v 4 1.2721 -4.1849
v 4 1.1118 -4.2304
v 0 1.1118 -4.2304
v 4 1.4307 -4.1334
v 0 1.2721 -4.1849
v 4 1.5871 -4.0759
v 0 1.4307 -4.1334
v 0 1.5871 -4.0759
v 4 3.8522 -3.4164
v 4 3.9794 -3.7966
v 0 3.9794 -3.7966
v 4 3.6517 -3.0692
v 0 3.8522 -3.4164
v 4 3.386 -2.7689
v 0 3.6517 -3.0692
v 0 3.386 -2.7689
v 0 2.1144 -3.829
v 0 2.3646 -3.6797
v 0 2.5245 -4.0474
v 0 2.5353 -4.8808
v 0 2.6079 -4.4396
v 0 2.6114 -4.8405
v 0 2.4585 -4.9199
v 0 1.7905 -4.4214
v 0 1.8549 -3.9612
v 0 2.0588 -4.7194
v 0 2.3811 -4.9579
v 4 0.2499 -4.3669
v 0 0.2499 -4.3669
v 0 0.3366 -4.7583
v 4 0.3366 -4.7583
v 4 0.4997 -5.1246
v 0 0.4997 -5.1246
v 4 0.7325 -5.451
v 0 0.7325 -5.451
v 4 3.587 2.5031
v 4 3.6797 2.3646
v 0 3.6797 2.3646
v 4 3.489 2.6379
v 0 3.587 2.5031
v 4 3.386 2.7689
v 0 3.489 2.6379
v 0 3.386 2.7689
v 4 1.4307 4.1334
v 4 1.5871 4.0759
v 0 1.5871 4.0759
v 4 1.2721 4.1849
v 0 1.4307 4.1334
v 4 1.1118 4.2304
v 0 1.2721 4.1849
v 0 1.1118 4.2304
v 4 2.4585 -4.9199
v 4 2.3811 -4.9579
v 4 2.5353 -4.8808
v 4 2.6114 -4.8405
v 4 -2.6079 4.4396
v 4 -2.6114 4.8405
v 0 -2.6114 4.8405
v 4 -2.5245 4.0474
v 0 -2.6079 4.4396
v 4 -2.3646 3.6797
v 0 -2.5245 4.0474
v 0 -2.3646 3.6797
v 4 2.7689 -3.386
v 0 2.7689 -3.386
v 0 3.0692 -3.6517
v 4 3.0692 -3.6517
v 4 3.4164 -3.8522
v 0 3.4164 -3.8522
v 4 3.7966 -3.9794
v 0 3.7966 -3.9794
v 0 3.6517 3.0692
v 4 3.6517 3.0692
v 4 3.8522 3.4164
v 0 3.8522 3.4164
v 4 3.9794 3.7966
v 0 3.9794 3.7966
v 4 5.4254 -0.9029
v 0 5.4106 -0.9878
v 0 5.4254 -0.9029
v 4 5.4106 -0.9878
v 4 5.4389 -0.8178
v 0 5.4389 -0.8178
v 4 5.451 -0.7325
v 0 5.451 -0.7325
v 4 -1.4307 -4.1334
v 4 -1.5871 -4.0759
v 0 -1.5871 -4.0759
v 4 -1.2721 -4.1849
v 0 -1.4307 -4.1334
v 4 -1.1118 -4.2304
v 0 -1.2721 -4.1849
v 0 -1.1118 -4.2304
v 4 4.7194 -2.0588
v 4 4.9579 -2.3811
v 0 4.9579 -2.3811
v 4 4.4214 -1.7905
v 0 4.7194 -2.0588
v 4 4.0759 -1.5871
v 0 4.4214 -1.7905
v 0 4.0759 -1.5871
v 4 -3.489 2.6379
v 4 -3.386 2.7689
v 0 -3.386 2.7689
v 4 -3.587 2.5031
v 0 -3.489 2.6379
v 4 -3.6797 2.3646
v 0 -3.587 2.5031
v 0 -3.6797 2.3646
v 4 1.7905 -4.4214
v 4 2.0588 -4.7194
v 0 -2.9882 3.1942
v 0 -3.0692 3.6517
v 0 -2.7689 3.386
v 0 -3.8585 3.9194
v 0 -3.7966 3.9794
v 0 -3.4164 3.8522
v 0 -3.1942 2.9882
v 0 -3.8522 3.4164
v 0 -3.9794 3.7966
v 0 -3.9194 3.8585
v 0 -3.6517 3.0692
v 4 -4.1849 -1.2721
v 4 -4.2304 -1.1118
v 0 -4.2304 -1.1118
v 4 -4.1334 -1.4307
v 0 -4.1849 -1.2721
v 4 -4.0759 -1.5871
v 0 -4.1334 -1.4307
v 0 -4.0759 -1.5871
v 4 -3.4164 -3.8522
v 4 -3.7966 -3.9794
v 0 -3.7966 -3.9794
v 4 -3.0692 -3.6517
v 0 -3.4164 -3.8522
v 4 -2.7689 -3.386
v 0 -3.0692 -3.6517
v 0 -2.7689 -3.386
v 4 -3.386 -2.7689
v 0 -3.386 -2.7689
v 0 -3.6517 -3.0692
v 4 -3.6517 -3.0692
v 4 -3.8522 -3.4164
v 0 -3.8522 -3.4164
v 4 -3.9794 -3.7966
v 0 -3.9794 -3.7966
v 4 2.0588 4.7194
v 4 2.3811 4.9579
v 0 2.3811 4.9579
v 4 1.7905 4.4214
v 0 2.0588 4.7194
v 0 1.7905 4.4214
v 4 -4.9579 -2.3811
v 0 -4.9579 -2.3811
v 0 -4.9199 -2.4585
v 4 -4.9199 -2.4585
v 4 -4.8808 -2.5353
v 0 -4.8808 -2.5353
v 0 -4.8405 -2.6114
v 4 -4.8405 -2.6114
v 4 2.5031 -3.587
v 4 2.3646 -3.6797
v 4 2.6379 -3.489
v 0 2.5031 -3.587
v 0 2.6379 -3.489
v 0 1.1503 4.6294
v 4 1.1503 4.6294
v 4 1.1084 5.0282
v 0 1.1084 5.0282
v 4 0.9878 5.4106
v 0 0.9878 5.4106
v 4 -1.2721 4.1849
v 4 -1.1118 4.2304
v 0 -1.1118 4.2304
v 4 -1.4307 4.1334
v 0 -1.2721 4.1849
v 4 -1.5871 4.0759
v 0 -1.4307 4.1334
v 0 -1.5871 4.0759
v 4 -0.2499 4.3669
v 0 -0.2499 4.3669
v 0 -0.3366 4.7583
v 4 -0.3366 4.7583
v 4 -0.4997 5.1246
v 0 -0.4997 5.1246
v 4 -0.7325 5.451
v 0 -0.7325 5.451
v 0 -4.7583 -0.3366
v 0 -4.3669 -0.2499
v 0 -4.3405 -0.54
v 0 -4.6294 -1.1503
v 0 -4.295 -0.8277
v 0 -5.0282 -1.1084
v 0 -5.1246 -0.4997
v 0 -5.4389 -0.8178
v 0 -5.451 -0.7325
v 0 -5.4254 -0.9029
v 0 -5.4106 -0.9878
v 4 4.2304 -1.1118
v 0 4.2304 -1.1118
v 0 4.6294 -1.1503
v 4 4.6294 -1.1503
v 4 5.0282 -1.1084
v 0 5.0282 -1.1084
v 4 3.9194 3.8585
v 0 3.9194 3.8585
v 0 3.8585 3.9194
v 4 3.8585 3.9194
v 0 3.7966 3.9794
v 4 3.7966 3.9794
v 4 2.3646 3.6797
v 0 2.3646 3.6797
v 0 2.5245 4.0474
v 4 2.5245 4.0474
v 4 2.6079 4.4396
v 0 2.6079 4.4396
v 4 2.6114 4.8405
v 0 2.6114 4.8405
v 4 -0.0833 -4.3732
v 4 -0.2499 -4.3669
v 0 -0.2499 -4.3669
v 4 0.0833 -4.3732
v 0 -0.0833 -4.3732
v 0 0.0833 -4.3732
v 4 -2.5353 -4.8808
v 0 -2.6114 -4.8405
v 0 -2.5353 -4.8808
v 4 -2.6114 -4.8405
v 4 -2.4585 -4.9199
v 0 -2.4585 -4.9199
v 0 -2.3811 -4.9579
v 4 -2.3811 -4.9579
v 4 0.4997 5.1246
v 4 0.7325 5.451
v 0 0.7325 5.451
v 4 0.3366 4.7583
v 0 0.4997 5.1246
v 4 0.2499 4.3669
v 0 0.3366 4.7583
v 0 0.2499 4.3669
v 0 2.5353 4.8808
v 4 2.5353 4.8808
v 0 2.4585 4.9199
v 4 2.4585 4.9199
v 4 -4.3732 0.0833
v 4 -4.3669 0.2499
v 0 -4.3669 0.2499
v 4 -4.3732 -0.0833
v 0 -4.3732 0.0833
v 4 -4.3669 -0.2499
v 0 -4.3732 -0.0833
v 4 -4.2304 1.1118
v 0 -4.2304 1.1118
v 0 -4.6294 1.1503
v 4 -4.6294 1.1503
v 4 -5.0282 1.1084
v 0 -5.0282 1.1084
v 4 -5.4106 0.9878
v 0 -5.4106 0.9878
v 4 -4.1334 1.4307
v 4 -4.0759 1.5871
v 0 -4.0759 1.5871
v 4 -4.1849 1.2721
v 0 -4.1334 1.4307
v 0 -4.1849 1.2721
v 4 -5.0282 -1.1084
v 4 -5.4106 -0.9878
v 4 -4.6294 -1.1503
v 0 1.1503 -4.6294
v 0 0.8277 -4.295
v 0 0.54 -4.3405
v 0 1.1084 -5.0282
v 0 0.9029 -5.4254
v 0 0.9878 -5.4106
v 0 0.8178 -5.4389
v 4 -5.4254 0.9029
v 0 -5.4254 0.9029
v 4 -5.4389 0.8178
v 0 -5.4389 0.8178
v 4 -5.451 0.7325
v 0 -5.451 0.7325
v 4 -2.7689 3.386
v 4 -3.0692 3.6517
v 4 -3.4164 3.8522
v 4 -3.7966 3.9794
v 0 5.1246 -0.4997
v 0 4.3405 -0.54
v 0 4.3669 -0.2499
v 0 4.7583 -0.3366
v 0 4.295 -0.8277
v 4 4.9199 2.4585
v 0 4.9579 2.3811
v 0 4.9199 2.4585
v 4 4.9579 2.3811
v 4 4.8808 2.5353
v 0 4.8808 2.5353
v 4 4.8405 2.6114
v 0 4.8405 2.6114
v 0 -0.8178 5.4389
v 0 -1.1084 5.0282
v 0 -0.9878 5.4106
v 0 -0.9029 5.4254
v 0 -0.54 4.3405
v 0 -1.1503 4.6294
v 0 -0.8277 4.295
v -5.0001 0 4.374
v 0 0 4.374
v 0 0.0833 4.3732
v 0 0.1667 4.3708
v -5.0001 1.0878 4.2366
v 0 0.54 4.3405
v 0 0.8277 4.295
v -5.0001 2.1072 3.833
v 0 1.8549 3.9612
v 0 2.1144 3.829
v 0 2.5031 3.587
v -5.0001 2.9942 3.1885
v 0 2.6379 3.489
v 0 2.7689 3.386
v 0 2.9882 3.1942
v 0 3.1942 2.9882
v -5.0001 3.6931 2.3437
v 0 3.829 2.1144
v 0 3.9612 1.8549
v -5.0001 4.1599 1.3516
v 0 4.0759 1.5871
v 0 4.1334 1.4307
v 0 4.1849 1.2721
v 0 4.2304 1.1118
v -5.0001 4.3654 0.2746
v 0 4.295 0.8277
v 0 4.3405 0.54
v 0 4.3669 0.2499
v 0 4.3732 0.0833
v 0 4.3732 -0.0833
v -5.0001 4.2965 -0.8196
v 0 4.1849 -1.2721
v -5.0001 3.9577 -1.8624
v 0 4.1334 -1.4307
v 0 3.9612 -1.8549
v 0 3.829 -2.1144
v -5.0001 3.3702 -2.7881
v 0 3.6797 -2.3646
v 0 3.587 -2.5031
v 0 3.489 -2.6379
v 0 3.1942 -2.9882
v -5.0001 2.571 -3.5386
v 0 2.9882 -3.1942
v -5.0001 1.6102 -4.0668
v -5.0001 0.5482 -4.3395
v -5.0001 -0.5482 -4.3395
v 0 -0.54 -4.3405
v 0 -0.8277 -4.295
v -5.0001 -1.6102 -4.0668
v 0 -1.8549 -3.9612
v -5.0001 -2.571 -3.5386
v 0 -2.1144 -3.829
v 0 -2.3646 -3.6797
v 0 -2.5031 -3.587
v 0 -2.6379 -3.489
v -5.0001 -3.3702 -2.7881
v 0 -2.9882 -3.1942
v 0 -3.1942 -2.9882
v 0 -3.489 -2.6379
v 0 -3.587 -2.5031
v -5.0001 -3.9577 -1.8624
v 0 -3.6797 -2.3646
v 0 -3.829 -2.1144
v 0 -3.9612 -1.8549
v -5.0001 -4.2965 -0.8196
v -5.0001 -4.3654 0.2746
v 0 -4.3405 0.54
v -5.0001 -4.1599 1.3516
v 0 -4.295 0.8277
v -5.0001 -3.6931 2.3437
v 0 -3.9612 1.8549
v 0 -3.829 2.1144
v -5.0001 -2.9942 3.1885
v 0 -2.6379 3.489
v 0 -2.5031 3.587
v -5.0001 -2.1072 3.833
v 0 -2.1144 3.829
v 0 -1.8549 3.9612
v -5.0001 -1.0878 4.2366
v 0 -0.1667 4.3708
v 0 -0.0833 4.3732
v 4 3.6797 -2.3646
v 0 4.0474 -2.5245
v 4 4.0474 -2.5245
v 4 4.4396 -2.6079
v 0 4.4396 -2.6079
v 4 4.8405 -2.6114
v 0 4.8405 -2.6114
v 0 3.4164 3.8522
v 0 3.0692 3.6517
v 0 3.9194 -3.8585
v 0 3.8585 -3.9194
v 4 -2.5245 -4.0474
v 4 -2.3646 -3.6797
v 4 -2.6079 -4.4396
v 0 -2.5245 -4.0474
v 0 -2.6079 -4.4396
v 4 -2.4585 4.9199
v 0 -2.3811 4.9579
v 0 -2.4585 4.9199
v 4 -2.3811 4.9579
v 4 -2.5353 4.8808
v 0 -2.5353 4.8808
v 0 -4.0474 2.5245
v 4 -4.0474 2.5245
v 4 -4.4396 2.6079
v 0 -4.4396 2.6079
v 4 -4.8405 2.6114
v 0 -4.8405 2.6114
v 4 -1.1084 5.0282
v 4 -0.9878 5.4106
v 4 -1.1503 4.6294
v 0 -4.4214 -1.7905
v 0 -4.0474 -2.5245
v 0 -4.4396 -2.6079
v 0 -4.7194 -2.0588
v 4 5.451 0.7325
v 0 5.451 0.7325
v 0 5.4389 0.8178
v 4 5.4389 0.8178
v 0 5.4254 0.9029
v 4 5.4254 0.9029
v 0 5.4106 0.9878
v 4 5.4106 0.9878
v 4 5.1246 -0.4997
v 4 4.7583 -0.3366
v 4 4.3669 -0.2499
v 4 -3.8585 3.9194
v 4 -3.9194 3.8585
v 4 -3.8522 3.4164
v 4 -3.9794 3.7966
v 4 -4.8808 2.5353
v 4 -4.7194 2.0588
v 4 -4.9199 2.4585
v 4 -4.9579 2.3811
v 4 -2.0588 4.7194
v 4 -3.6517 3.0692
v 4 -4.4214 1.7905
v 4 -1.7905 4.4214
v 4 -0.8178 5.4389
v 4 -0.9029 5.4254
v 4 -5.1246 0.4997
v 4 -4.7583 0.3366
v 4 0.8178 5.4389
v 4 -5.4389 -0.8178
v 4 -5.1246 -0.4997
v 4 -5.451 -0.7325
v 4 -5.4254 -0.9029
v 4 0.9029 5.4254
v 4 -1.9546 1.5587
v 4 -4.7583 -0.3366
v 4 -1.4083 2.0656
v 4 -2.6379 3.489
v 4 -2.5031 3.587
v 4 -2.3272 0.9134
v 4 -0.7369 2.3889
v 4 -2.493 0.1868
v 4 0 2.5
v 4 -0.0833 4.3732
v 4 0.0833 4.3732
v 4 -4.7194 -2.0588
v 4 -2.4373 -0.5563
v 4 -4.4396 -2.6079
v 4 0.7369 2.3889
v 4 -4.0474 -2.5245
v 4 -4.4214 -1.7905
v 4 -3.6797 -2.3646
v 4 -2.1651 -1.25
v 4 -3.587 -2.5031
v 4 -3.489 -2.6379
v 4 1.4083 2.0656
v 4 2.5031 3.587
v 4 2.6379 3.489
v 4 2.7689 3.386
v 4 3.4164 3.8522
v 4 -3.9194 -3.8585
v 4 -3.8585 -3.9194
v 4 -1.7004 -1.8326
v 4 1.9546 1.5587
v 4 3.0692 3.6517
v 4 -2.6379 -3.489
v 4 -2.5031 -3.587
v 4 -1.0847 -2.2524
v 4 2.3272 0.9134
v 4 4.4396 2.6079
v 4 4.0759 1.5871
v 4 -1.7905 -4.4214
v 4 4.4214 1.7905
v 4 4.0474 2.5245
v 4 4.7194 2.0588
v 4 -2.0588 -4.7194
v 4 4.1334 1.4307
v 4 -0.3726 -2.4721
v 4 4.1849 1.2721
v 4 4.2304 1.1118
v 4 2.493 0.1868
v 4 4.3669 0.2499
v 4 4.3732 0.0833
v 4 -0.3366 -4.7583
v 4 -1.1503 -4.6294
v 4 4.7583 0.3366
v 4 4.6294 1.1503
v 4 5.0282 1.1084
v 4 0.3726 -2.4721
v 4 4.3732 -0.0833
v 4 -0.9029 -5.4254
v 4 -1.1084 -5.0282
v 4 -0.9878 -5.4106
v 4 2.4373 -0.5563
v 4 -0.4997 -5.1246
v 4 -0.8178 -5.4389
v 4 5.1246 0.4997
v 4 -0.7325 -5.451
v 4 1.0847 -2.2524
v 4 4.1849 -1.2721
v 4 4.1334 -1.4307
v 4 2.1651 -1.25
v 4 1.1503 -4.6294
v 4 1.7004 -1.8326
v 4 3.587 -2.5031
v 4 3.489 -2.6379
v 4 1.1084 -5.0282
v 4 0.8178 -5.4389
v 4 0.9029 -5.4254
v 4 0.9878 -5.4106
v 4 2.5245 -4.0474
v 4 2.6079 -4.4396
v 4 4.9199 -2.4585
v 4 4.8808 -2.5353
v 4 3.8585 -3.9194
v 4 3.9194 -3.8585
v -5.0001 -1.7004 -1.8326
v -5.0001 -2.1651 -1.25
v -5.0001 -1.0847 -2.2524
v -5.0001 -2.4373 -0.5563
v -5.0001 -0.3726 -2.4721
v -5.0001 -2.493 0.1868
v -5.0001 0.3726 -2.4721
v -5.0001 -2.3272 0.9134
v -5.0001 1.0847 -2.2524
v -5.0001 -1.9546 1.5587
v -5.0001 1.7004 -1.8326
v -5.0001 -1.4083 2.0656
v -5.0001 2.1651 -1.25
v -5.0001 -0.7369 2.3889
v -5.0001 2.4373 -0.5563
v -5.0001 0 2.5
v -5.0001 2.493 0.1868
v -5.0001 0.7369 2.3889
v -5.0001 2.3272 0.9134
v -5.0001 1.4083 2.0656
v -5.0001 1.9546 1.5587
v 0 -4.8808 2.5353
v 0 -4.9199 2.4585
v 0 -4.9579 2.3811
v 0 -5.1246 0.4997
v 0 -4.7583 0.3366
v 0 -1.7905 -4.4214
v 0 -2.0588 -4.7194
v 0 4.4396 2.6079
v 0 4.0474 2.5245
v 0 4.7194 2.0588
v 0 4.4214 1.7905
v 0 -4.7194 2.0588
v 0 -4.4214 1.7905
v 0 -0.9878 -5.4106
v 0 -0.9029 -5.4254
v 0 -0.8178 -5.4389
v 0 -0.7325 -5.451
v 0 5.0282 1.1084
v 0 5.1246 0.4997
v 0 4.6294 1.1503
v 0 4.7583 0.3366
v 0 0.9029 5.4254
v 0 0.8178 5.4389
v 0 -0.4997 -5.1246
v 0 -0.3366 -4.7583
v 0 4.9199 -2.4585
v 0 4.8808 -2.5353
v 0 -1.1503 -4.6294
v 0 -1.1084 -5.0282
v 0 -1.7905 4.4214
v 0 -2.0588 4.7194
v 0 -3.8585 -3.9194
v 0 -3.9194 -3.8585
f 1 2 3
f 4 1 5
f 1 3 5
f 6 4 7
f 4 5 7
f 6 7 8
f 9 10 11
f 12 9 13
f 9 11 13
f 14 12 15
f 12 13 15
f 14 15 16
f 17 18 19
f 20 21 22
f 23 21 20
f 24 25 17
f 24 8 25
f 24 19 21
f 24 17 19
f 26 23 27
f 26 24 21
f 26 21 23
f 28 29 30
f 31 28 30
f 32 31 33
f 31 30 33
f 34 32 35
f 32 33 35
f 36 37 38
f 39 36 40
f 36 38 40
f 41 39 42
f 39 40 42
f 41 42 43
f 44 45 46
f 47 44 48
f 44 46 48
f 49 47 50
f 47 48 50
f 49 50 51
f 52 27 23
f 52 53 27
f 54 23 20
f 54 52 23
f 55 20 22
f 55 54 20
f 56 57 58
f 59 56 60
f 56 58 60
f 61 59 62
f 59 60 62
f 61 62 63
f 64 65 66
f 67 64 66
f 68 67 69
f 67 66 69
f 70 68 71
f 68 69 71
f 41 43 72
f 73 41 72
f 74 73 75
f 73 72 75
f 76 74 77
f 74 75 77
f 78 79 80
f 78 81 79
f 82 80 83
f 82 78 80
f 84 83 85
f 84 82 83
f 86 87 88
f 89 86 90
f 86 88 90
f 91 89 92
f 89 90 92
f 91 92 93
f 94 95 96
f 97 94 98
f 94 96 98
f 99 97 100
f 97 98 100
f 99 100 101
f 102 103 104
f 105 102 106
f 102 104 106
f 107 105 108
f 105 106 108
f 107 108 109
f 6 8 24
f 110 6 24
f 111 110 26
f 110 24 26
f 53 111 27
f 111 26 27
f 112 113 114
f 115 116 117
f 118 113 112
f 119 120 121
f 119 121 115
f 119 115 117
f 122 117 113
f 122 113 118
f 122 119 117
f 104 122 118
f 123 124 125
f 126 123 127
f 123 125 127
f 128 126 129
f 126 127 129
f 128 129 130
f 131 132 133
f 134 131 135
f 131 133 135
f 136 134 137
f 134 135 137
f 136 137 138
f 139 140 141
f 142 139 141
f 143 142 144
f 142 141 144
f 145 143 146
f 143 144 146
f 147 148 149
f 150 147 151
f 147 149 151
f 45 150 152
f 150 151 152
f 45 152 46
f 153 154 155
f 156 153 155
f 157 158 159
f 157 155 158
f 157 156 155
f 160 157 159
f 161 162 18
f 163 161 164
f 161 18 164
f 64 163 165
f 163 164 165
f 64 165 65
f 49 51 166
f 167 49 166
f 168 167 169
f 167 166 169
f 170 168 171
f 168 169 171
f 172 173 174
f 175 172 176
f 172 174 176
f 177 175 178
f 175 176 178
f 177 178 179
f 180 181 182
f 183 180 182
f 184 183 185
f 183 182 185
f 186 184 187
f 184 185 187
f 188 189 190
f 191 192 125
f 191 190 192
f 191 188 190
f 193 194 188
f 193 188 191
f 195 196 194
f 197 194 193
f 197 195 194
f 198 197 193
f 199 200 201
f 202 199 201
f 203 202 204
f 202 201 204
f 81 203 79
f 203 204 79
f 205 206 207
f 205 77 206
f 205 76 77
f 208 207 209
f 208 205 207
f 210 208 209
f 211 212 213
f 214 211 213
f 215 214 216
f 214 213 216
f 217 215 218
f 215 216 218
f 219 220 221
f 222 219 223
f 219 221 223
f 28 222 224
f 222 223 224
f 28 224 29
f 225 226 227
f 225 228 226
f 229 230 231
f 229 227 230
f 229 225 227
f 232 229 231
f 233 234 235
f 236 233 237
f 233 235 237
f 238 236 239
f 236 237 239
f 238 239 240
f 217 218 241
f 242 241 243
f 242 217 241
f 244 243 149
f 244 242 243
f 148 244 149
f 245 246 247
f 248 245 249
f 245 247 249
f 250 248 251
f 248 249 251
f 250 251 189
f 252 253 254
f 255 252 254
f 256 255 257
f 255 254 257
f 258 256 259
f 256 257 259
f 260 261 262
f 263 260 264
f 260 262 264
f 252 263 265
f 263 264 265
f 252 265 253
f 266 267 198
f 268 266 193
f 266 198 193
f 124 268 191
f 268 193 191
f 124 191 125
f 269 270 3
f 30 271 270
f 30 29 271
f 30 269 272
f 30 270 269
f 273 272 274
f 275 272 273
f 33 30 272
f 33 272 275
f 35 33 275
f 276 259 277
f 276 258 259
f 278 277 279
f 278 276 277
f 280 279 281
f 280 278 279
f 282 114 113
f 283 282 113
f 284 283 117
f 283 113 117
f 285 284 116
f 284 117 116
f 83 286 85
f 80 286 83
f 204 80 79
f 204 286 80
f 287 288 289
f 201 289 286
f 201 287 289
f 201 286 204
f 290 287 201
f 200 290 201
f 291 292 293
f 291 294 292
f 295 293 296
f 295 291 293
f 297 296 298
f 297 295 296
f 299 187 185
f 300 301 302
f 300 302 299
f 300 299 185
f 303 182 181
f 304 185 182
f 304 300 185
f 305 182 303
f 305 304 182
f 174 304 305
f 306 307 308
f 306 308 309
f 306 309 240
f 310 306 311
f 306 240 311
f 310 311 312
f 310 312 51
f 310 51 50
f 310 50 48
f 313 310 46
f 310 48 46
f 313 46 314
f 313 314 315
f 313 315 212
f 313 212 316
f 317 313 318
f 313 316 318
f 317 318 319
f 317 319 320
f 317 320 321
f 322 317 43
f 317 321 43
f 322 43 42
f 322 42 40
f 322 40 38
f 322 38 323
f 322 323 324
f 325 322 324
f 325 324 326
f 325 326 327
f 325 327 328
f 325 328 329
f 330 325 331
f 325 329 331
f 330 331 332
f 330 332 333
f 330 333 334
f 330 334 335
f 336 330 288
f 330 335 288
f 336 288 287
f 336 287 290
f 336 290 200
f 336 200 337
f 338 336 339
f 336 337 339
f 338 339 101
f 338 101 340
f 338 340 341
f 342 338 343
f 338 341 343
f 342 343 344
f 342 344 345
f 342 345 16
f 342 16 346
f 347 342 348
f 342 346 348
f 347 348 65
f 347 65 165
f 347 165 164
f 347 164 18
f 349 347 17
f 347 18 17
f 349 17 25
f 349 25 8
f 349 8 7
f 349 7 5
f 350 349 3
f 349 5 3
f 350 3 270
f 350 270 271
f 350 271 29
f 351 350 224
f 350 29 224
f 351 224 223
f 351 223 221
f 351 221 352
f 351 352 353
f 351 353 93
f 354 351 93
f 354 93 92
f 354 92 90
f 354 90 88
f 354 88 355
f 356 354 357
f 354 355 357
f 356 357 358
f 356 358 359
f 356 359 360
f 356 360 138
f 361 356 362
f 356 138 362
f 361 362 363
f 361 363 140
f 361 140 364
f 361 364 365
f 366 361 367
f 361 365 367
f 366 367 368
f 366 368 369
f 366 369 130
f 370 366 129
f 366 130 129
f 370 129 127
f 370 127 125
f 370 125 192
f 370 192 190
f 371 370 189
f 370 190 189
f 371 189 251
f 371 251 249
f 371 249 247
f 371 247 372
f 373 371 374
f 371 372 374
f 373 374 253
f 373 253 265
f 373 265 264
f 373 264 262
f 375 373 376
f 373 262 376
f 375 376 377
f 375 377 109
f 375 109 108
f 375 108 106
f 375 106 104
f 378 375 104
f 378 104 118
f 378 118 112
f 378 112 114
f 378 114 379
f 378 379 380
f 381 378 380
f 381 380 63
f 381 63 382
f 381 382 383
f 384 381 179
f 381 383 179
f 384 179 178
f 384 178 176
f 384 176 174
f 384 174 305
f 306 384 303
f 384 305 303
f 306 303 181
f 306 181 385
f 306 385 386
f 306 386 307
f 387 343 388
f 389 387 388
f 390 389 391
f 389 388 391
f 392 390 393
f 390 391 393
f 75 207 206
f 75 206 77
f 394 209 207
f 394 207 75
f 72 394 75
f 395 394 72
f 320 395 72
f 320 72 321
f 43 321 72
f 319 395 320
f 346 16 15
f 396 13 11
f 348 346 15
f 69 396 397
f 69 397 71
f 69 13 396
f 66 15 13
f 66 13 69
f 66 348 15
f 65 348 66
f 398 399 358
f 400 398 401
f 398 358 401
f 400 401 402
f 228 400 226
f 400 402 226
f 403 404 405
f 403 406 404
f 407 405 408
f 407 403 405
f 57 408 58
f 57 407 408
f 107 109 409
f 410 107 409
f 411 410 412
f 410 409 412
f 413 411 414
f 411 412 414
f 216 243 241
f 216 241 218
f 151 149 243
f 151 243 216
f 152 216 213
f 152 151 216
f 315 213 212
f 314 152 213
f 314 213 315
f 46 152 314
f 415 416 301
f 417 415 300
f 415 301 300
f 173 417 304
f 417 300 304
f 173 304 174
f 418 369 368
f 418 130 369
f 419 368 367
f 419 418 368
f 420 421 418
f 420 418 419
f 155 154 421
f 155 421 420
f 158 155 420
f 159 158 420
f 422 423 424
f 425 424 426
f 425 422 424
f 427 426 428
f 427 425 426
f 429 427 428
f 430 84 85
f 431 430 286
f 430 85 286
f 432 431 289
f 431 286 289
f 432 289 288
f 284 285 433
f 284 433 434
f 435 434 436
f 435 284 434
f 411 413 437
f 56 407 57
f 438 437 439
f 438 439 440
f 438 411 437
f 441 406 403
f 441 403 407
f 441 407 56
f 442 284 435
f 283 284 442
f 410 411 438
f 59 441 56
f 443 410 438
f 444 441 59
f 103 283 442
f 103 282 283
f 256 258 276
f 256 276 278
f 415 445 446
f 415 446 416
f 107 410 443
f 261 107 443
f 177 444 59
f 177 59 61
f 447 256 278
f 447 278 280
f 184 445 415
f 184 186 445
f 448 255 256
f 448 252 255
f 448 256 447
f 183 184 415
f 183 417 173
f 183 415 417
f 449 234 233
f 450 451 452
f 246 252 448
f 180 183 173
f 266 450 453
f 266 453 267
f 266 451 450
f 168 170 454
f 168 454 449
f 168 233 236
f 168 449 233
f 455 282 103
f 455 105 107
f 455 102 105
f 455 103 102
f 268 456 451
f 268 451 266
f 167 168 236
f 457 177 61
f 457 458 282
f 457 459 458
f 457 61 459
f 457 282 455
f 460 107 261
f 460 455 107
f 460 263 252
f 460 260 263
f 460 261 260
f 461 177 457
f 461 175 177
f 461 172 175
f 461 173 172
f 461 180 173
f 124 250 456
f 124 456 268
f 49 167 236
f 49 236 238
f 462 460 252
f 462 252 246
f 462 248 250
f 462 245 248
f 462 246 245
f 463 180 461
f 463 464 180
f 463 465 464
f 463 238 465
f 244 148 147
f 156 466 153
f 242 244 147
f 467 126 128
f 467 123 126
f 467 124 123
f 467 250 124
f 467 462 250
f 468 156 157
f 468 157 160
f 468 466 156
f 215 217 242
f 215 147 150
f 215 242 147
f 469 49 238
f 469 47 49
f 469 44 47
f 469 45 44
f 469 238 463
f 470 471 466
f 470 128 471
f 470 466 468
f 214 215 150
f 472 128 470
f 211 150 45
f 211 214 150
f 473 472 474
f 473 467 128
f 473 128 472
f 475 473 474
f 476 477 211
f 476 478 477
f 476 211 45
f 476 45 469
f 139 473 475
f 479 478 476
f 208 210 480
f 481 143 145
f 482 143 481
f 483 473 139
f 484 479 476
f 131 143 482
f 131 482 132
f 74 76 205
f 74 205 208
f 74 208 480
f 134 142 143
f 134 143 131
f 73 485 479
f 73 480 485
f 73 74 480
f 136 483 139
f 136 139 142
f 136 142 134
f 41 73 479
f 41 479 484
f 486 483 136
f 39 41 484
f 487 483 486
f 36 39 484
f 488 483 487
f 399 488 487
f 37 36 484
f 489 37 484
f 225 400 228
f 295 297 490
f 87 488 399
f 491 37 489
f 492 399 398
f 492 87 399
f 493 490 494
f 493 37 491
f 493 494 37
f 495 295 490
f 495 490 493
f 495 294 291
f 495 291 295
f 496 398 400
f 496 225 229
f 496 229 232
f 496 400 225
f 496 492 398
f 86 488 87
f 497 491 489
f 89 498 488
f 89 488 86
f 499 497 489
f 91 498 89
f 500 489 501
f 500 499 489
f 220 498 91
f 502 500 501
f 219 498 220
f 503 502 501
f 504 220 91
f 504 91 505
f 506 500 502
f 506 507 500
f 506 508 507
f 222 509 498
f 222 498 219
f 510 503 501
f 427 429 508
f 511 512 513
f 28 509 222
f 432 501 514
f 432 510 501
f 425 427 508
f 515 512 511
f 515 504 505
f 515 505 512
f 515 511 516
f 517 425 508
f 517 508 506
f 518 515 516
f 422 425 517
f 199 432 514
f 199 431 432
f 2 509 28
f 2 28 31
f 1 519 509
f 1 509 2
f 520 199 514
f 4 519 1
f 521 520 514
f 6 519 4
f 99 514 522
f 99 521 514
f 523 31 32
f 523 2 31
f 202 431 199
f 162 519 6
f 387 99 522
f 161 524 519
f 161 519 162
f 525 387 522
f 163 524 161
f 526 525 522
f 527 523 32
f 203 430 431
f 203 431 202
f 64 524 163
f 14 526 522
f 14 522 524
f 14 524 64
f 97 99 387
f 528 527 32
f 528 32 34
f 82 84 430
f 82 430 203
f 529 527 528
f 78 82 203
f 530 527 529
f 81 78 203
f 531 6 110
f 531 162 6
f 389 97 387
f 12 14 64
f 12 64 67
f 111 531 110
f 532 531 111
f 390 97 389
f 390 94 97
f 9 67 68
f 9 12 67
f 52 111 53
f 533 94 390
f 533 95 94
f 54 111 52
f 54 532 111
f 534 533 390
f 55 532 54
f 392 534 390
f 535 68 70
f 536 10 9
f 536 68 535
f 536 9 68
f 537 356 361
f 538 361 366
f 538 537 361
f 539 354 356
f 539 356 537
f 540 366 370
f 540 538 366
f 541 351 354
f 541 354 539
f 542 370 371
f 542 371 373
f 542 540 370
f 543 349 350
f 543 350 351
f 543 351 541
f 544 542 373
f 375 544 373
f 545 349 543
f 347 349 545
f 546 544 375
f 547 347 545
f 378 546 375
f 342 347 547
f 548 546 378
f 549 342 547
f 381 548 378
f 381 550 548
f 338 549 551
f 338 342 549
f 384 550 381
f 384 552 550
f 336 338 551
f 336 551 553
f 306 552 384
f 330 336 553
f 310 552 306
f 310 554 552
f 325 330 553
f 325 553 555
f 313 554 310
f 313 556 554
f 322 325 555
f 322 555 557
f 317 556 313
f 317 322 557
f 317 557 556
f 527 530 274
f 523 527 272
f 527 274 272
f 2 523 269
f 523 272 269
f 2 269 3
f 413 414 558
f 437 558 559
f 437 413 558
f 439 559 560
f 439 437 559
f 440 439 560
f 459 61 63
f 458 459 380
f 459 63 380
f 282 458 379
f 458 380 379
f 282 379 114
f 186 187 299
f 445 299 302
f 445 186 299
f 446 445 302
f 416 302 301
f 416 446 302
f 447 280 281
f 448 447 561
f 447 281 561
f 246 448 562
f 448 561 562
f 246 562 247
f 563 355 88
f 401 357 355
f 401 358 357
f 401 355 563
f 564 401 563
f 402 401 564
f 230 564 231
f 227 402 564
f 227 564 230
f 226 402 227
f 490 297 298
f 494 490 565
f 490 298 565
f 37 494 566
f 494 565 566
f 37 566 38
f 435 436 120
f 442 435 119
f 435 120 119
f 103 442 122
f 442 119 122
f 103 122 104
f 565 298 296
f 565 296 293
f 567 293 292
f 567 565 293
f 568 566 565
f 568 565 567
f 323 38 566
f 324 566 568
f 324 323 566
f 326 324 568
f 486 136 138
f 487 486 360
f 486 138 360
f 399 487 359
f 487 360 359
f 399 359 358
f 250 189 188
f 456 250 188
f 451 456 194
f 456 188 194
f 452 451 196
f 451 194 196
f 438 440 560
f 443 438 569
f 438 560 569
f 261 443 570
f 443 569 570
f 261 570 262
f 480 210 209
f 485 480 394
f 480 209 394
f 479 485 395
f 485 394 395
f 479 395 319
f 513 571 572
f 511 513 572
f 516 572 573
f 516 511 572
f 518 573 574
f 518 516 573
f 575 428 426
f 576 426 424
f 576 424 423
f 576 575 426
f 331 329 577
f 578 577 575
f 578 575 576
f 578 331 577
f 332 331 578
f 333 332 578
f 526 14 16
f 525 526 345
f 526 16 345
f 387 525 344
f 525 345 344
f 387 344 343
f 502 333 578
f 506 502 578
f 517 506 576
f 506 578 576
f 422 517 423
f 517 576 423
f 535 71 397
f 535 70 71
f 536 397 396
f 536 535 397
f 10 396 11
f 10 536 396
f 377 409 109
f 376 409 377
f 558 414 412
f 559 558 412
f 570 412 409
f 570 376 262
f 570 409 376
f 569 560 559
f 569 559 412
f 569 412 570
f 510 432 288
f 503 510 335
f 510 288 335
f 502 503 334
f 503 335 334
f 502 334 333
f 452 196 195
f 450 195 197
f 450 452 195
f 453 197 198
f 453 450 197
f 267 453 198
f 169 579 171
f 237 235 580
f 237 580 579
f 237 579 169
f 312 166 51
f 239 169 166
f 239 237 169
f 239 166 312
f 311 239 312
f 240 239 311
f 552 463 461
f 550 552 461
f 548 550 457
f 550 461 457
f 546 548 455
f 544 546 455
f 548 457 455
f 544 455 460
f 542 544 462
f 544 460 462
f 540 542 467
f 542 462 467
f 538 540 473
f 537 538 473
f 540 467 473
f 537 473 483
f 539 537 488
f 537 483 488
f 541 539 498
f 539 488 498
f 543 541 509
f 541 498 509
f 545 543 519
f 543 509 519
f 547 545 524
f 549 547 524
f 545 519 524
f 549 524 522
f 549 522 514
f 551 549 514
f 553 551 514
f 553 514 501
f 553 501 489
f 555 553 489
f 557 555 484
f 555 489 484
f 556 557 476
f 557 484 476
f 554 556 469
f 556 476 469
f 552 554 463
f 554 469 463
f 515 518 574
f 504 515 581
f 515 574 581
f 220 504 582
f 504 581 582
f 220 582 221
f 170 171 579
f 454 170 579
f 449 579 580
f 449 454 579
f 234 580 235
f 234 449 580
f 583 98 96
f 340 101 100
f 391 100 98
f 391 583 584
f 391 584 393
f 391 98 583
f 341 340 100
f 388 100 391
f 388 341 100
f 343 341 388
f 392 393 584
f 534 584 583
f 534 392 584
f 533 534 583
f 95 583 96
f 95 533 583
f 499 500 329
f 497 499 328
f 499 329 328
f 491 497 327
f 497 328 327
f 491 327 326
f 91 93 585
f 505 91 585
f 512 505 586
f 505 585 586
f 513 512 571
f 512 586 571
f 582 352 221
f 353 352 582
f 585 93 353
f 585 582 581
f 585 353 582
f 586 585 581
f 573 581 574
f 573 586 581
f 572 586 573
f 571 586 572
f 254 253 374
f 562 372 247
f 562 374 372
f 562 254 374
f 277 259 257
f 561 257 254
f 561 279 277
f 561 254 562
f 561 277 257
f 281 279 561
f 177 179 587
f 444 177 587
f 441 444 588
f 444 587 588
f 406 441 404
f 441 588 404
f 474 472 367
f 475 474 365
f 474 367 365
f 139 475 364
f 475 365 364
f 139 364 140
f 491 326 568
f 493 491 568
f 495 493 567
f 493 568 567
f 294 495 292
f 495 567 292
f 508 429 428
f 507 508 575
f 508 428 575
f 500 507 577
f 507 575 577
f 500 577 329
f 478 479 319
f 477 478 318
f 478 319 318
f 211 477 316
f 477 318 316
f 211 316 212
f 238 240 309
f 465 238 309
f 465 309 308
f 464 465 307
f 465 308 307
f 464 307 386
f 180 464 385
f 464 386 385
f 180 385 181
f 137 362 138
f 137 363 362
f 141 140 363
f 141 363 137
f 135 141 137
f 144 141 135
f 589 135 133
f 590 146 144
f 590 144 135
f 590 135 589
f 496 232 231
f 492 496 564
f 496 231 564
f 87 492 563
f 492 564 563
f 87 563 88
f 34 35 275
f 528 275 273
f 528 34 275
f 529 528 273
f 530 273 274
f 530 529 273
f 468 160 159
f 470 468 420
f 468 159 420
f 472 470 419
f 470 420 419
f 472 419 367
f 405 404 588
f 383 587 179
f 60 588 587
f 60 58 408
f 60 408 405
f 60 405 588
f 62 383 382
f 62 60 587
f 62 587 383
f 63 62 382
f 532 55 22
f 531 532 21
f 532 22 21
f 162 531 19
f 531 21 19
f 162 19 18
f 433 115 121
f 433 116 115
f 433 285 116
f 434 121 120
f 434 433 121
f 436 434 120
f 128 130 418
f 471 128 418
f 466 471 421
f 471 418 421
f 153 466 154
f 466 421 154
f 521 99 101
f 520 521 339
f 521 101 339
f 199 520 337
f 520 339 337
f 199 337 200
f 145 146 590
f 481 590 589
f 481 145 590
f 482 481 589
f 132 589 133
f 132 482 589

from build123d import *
from build123d.topology import SkipClean

# Parameters (mm, degrees)
BASPROSKE_W         = 5
BASPROSKE_H         = 5.5
TOOTHCUT_DEPTH      = 10.246621004
TEETHCUTS_COUNT     = 20
TEETHCUTS_ANGLE     = 342
HUBNEAONESKE_R      = 4.374
HUBNEARONE_DEPTH    = 5.0000508
BORSKE_R            = 2.5
BORE_DEPTH          = 10.0000508
SKETCH_1_R          = 5.5
CUT_EXTRUDE_1_DEPTH = 1


with BuildPart() as part:
    # BasProSke → Base-Revolve (revolve)
    with BuildSketch(Plane(origin=(0, 0, 0), x_dir=(1, 0, 0), z_dir=(0, 1, 0)), mode=Mode.PRIVATE) as base_revolve_sk:
        with Locations((2.5, 2.75)):
            Rectangle(BASPROSKE_W, BASPROSKE_H)
    revolve(base_revolve_sk.sketch.rotate(Axis((-10, 0, 0), (1, 0, 0)), 180), axis=Axis((-10, 0, 0), (1, 0, 0)))

    # TooCutSke → ToothCut (cut, through all)
    with BuildSketch(Plane(origin=(0, 0, 0), x_dir=(0, 0, -1), z_dir=(1, 0, 0))):
        with BuildLine():
            ThreePointArc((0.249903181, 4.366855207), (0, 4.374), (-0.249903181, 4.366855207))
            ThreePointArc((-0.249903181, 4.366855207), (-0.415207844, 4.95951031), (-0.752843848, 5.473871692))
            ThreePointArc((-0.752843848, 5.473871692), (0, 5.5254), (0.752843848, 5.473871692))
            ThreePointArc((0.752843848, 5.473871692), (0.415207844, 4.95951031), (0.249903181, 4.366855207))
        make_face()
    toothcut = extrude(amount=TOOTHCUT_DEPTH, mode=Mode.SUBTRACT)

    # TeethCuts: ToothCut ×20 about axis
    teethcuts_axis = Axis((-10, 0, 0), (1, 0, 0))
    for i in range(1, TEETHCUTS_COUNT):
        add(toothcut.rotate(teethcuts_axis, i * TEETHCUTS_ANGLE / (TEETHCUTS_COUNT - 1)), mode=Mode.SUBTRACT)

    # HubNeaOneSke → HubNearOne (add)
    with SkipClean():  # the faces are left unmerged after this step: merging them gives an invalid solid
        with BuildSketch(Plane.ZY):
            Circle(HUBNEAONESKE_R)
        extrude(amount=HUBNEARONE_DEPTH)

    # BorSke → Bore (cut, symmetric)
    with SkipClean():  # the faces are left unmerged after this step: merging them gives an invalid solid
        with BuildSketch(Plane(origin=(0, 0, 0), x_dir=(0, 0, -1), z_dir=(1, 0, 0))):
            with Locations(Location((0, 0, 0), (0, 0, 180))):
                Circle(BORSKE_R)
        extrude(amount=BORE_DEPTH, both=True, mode=Mode.SUBTRACT)

    # 草图1 → 切除-拉伸1 (cut)
    with SkipClean():  # the faces are left unmerged after this step: merging them gives an invalid solid
        with BuildSketch(Plane(origin=(5, 0, 0), x_dir=(0, 0, -1), z_dir=(1, 0, 0))):
            Circle(SKETCH_1_R)
        extrude(amount=-CUT_EXTRUDE_1_DEPTH, mode=Mode.SUBTRACT)


solid = part.part
